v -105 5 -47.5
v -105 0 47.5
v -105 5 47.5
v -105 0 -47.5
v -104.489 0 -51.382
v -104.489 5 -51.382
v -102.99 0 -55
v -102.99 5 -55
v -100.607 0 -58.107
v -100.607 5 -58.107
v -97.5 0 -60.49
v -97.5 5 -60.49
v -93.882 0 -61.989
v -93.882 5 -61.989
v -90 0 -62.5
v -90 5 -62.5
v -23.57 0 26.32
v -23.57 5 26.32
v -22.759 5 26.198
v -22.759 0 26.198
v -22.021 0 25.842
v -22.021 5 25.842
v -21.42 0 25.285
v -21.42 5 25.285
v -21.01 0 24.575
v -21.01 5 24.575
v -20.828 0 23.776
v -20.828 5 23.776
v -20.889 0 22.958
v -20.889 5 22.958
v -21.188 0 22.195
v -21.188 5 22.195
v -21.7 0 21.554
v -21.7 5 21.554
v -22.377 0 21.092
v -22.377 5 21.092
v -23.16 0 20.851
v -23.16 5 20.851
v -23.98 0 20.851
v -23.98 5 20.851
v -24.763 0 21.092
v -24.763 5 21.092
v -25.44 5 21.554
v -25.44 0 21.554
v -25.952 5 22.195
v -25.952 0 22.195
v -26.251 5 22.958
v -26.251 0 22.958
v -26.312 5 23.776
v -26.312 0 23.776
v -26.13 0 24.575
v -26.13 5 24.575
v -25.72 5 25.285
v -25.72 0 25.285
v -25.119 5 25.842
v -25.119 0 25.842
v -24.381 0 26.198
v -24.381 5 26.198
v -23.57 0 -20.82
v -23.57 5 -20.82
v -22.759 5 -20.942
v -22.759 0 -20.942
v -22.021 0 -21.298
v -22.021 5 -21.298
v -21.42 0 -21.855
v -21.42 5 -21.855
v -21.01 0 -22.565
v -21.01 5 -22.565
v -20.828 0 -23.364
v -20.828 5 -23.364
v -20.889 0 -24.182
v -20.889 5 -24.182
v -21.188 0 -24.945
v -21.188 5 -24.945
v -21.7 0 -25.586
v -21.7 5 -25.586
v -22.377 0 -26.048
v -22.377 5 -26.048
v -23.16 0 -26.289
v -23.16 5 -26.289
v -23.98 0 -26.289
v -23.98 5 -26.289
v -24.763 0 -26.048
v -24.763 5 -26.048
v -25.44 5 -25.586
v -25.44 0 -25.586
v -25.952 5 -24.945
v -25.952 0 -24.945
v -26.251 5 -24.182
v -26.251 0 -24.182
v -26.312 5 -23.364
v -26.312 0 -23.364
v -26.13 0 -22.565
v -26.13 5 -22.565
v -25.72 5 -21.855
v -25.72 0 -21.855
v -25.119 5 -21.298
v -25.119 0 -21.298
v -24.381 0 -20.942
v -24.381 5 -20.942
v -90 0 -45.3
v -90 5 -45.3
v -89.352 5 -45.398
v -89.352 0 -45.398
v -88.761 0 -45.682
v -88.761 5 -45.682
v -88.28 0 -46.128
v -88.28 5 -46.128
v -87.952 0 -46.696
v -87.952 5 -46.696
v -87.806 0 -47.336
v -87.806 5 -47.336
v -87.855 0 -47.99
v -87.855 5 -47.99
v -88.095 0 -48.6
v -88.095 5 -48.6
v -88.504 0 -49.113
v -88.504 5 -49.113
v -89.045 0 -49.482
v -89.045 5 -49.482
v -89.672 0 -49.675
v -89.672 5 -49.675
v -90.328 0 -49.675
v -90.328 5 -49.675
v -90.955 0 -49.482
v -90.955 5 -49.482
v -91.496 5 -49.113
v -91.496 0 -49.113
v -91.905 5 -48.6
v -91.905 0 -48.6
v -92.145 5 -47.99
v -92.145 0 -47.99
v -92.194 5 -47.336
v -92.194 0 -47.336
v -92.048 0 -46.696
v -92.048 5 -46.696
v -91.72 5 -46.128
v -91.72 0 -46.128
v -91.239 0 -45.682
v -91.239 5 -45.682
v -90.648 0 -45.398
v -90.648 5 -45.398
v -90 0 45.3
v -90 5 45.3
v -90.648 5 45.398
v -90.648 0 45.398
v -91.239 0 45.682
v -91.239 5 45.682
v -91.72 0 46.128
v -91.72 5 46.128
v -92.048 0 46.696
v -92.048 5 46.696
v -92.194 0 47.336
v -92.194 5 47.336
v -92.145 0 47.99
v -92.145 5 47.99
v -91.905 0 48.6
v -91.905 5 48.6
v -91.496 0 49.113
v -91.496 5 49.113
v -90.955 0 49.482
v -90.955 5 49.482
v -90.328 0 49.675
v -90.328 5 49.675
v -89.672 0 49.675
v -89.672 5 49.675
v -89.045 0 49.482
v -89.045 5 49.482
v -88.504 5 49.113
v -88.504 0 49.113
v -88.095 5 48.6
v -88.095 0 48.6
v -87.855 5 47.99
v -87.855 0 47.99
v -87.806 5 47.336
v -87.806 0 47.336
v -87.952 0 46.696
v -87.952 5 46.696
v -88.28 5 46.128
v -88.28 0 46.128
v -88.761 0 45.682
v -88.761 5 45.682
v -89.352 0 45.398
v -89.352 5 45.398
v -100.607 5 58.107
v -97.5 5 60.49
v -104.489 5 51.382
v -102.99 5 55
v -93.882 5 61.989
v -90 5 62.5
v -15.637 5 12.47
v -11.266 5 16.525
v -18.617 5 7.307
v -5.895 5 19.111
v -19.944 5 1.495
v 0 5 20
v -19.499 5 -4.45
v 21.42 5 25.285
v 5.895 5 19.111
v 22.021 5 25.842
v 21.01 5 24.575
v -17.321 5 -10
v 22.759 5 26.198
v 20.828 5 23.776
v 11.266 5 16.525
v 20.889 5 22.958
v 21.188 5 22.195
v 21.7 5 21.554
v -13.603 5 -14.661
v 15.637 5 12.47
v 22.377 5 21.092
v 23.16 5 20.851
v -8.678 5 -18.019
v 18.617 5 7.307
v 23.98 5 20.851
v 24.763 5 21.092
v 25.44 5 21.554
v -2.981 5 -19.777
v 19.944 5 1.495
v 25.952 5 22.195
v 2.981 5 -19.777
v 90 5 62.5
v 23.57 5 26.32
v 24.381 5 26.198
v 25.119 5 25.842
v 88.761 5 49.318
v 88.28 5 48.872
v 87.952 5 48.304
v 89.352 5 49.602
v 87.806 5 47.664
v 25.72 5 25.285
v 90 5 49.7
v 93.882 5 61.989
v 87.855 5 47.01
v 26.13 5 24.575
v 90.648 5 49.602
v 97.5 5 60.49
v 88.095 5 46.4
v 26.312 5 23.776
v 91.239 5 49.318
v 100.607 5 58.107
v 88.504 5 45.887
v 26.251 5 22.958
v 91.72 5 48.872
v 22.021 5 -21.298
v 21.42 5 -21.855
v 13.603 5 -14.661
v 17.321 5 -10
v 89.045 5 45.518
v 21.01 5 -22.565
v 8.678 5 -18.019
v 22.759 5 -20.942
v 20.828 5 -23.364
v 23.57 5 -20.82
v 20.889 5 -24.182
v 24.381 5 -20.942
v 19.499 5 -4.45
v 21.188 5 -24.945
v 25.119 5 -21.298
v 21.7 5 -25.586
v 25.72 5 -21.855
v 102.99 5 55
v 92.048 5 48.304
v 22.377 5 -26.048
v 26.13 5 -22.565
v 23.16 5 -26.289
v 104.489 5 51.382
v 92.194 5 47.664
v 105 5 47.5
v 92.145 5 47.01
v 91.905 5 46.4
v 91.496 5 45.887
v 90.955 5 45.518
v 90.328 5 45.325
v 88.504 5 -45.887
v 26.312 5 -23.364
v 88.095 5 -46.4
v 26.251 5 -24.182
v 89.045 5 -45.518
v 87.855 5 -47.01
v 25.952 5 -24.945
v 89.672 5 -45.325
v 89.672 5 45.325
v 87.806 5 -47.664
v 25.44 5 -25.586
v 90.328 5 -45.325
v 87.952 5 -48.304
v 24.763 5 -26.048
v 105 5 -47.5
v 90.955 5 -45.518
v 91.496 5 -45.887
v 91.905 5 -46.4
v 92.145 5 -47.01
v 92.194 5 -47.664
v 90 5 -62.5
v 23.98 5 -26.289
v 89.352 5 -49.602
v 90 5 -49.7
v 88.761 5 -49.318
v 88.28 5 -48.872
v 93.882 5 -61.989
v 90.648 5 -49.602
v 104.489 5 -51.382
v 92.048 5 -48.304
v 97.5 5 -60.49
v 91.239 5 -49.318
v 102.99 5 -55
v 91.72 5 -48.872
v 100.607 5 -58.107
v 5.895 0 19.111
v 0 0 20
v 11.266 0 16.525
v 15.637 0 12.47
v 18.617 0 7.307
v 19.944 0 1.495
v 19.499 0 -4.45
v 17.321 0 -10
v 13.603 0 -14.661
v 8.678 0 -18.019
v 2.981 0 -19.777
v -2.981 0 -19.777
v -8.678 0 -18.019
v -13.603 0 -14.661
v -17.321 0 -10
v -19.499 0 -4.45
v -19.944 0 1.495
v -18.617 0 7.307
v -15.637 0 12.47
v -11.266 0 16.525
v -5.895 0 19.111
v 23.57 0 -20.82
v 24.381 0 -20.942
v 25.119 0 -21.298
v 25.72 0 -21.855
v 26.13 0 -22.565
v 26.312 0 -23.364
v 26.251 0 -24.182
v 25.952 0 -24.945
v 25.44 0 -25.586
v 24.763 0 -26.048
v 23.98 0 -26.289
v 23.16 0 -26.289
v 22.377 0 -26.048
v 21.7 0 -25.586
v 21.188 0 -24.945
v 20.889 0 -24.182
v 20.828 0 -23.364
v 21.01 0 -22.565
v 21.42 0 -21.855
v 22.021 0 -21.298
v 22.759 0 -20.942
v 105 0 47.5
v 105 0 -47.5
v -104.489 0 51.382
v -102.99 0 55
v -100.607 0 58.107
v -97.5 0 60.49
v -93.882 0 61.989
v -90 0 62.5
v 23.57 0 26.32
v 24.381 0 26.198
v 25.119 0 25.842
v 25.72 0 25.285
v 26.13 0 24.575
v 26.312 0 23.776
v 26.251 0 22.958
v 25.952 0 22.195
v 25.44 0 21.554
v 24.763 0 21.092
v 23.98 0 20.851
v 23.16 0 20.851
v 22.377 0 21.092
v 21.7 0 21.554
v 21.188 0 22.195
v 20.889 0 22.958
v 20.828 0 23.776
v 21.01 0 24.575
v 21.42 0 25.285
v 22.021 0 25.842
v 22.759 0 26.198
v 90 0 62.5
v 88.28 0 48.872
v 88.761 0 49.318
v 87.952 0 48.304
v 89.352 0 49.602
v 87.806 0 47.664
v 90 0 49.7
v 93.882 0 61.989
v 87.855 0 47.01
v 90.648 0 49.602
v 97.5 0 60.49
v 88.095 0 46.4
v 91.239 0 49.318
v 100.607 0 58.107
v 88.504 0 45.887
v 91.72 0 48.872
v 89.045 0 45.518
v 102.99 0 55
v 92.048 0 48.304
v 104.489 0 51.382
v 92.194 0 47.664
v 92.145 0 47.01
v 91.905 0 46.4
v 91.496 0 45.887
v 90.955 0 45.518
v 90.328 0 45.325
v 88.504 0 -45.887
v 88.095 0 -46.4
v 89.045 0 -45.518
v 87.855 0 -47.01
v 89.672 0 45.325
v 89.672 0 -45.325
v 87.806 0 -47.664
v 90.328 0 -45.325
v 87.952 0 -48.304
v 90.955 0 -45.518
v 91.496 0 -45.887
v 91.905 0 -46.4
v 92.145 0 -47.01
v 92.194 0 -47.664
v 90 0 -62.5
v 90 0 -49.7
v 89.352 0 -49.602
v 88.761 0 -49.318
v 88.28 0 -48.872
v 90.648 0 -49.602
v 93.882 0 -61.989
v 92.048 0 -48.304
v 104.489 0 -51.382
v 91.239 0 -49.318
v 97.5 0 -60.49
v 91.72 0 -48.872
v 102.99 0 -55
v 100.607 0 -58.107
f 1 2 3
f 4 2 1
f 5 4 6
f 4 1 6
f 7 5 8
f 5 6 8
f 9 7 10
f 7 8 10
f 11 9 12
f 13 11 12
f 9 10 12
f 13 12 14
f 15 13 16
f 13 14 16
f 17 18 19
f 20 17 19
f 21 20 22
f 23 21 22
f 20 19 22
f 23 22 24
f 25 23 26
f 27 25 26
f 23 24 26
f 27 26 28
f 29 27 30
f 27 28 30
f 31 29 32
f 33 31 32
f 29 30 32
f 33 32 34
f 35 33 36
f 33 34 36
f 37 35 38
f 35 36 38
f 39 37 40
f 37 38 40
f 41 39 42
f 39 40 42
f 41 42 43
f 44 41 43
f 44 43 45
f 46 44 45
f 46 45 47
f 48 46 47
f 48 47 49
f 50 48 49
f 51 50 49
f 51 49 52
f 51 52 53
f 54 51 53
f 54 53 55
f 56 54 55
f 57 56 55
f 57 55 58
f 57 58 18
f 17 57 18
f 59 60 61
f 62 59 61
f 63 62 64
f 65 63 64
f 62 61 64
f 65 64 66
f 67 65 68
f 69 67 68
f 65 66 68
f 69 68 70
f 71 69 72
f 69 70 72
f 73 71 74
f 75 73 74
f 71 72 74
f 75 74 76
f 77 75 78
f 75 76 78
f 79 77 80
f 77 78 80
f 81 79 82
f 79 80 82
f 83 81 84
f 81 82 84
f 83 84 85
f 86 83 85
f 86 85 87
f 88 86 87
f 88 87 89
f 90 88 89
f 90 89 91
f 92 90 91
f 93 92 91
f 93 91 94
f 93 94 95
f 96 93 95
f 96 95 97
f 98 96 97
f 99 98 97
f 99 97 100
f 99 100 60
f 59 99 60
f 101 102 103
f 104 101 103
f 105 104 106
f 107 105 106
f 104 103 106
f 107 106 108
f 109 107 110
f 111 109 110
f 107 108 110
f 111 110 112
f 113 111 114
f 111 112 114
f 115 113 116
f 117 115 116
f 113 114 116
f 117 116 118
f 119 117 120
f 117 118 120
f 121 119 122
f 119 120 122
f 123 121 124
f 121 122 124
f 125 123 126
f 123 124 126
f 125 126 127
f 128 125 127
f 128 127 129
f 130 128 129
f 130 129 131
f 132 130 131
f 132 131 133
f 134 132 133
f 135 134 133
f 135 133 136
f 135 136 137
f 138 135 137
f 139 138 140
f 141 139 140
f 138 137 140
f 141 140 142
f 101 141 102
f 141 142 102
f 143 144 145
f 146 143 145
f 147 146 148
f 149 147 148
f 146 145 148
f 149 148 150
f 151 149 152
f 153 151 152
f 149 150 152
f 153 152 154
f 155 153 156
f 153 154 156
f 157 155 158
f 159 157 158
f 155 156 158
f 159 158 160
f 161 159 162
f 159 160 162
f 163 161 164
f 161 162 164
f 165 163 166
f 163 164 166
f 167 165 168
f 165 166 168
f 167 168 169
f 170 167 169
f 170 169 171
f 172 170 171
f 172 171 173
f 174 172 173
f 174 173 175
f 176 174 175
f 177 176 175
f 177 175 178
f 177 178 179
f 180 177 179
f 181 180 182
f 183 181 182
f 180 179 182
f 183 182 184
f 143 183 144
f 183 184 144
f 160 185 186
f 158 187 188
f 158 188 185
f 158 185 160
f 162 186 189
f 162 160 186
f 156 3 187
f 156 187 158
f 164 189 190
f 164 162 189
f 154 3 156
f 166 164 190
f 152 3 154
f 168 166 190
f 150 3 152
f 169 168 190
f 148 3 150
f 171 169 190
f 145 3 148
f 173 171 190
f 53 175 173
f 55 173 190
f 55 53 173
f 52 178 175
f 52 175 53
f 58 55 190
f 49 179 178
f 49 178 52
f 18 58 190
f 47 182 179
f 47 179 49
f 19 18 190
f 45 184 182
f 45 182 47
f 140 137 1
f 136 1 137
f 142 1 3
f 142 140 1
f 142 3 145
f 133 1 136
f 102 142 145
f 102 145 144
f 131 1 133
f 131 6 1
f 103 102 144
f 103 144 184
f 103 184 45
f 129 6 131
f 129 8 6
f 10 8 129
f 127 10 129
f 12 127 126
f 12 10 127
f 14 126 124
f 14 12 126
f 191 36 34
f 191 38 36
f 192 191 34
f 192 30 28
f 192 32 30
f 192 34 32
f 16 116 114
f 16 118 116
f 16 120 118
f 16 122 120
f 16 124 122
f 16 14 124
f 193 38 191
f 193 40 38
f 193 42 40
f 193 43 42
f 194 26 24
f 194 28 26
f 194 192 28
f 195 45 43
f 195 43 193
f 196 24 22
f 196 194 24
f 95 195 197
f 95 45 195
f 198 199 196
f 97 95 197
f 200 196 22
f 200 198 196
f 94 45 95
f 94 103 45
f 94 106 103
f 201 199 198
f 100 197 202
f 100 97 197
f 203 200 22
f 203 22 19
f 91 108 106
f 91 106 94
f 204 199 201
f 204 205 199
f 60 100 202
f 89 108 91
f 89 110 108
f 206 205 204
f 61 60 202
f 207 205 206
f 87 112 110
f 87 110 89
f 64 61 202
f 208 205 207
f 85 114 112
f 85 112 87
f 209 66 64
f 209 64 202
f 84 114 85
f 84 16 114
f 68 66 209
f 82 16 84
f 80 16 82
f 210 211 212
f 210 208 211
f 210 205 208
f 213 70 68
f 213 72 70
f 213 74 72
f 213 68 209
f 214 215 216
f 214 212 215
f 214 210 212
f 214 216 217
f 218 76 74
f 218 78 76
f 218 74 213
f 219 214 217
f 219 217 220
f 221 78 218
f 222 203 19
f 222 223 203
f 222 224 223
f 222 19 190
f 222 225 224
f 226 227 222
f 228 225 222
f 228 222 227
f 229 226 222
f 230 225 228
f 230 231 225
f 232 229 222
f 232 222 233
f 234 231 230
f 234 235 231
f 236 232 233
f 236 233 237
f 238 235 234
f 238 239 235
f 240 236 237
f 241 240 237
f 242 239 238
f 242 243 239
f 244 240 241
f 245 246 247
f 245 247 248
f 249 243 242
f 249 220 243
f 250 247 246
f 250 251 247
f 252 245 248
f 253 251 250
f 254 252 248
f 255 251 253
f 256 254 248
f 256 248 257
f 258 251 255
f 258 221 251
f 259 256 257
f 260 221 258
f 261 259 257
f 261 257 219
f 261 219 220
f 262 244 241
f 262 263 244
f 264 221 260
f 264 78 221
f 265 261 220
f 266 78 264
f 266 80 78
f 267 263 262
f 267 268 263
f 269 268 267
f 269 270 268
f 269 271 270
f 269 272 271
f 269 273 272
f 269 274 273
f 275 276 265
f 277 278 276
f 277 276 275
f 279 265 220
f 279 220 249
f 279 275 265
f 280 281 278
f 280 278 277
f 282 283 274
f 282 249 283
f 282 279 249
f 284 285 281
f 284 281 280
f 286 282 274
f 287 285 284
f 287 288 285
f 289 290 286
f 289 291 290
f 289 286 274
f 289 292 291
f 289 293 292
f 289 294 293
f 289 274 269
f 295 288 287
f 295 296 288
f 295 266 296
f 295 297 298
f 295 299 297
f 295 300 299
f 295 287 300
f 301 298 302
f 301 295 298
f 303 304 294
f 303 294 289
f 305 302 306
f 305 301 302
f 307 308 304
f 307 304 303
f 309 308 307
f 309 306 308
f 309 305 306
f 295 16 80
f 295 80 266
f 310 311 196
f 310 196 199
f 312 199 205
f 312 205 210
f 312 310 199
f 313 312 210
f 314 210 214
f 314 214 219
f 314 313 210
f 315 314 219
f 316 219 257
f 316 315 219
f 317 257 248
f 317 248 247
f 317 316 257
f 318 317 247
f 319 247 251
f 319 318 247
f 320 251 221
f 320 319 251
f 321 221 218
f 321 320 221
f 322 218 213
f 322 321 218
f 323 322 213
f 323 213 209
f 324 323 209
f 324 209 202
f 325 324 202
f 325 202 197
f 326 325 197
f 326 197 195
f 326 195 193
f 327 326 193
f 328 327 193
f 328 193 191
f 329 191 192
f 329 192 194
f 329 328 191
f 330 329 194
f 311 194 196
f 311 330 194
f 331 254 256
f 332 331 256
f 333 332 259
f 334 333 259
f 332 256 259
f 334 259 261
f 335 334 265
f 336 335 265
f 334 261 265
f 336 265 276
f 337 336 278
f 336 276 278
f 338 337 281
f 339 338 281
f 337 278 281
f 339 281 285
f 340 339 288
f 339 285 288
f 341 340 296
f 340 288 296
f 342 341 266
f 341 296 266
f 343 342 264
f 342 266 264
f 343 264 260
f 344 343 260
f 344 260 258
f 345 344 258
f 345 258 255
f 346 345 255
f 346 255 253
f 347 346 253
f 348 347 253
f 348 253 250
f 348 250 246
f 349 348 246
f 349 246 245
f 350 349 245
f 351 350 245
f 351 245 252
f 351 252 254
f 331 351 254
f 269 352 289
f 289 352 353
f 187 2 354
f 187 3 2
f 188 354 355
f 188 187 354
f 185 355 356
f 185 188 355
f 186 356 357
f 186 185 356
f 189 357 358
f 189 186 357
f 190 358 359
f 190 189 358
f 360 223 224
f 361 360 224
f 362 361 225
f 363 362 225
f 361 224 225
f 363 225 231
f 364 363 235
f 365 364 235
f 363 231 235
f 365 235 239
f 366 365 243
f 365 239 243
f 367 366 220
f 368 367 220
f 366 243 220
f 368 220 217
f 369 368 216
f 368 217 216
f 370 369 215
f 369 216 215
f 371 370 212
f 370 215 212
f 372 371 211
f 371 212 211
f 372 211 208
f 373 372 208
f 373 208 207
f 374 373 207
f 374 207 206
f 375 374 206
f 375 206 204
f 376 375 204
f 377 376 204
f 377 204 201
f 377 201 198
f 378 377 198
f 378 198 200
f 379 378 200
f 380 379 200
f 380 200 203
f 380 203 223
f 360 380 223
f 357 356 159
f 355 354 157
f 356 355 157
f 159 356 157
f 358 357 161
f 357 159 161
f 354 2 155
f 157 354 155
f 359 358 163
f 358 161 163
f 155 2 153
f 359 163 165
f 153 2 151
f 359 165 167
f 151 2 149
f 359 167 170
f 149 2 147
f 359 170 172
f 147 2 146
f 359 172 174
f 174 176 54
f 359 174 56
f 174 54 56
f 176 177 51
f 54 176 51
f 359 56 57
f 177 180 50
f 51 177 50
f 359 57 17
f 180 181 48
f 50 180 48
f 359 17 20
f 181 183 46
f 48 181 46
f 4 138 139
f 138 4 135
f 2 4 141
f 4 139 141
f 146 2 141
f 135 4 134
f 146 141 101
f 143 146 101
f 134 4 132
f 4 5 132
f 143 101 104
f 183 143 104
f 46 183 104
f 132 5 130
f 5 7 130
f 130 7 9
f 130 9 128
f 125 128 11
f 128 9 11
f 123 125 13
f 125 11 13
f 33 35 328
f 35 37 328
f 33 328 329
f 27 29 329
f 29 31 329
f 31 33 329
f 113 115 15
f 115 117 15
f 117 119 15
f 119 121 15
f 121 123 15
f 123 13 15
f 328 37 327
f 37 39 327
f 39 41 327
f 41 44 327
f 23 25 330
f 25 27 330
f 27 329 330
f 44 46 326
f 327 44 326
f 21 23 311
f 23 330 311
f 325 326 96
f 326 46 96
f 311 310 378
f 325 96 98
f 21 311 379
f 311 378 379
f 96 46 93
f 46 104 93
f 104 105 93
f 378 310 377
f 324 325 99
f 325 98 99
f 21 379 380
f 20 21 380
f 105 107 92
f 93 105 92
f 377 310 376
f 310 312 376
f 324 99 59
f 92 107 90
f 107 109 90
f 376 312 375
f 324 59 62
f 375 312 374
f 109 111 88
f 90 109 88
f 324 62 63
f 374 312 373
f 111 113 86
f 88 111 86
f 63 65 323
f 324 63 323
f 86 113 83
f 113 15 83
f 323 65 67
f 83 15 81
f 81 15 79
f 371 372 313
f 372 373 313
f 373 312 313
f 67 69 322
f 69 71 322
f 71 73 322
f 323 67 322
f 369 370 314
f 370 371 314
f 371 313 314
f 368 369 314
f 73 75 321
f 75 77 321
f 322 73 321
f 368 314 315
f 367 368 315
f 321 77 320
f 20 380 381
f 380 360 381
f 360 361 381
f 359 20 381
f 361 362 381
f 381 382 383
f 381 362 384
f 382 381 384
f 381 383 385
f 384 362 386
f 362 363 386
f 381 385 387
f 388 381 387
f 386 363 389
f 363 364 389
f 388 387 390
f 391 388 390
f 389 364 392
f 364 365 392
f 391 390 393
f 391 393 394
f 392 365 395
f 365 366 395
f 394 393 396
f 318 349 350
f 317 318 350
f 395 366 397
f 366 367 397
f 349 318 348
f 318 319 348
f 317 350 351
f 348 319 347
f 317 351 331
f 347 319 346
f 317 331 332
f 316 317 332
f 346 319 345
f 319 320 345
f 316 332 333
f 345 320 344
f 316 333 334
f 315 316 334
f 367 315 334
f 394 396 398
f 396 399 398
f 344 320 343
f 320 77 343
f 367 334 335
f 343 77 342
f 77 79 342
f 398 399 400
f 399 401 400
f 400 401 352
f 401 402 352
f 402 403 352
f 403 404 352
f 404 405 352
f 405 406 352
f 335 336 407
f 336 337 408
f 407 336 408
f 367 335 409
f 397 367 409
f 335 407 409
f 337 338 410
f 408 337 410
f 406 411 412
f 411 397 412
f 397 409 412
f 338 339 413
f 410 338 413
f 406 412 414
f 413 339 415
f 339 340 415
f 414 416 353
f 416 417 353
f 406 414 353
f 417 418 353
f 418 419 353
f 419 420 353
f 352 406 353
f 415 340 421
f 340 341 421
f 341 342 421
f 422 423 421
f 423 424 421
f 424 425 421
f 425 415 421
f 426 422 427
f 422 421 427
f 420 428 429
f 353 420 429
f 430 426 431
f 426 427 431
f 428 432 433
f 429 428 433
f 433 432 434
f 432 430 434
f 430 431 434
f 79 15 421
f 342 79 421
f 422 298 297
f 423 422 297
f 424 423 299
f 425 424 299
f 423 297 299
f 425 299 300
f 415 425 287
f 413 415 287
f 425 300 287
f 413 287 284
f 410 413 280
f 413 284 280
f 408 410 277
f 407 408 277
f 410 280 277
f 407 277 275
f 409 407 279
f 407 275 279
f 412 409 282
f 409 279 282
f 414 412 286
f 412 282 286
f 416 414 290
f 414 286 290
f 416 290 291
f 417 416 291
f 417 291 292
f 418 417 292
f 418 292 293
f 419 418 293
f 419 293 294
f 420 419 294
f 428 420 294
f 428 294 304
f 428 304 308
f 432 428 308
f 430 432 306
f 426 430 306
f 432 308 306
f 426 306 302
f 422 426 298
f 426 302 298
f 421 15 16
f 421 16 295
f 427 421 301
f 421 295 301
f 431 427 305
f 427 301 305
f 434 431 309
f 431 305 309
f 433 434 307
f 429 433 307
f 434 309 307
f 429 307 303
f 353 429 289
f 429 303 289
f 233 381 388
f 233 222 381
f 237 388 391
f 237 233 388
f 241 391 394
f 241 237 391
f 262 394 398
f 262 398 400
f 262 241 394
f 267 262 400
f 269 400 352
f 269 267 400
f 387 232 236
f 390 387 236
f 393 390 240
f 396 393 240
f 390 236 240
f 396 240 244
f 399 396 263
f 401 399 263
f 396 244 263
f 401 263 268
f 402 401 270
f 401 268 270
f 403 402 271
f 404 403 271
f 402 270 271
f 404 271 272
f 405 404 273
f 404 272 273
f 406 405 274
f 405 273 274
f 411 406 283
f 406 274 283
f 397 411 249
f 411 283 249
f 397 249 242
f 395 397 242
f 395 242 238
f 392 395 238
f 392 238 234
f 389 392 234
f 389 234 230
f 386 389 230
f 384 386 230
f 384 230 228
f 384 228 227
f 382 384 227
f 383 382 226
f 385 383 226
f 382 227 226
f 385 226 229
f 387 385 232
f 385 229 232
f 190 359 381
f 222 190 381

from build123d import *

# Parameters (mm, degrees)
SKETCH_1_R          = 60
SKETCH_1_R_2        = 20
EXTRUDE_1_DEPTH     = 5
SKETCH_4_W          = 210
SKETCH_4_H          = 125
SKETCH_4_R          = 60
EXTRUDE_2_DEPTH     = 5
SKETCH_5_R          = 2.2
CUT_EXTRUDE_2_DEPTH = 5
FILLET_1_R          = 15
SKETCH_2_R          = 2.75
CUT_EXTRUDE_3_DEPTH = 10


with BuildPart() as part:
    # 草图1 → 凸台-拉伸1 (new body)
    with BuildSketch(Plane(origin=(0, 0, 0), x_dir=(1, 0, 0), z_dir=(0, 1, 0))):
        with Locations(Location((0, 0, 0), (0, 0, 270))):
            Circle(SKETCH_1_R)
        with Locations(Location((0, 0, 0), (0, 0, 270))):
            Circle(SKETCH_1_R_2, mode=Mode.SUBTRACT)
    extrude(amount=EXTRUDE_1_DEPTH)

    # 草图4 → 凸台-拉伸2 (add)
    with BuildSketch(Plane(origin=(0, 0, 0), x_dir=(1, 0, 0), z_dir=(0, 1, 0))):
        Rectangle(SKETCH_4_W, SKETCH_4_H)
        Circle(SKETCH_4_R, mode=Mode.SUBTRACT)
    extrude(amount=EXTRUDE_2_DEPTH)

    # 草图5 → 切除-拉伸2 (cut)
    with BuildSketch(Plane(origin=(0, 5, 0), x_dir=(1, 0, 0), z_dir=(0, 1, 0))):
        with Locations(Location((-90, 47.5, 0), (0, 0, 270))):
            Circle(SKETCH_5_R)
        with Locations(Location((90, 47.5, 0), (0, 0, 90))):
            Circle(SKETCH_5_R)
        with Locations(Location((90, -47.5, 0), (0, 0, 270))):
            Circle(SKETCH_5_R)
        with Locations(Location((-90, -47.5, 0), (0, 0, 90))):
            Circle(SKETCH_5_R)
    extrude(amount=-CUT_EXTRUDE_2_DEPTH, mode=Mode.SUBTRACT)

    # 圆角1
    fillet_1_edges = [part.edges().sort_by_distance(p)[0] for p in [
        (-105, 2.5, -62.5),
        (-105, 2.5, 62.5),
        (105, 2.5, 62.5),
        (105, 2.5, -62.5),
    ]]
    fillet(fillet_1_edges, radius=FILLET_1_R)

    # 草图2 → 切除-拉伸3 (cut)
    with BuildSketch(Plane(origin=(0, 5, 0), x_dir=(1, 0, 0), z_dir=(0, 1, 0))):
        with Locations(Location((-23.57, 23.57, 0), (0, 0, 270))):
            Circle(SKETCH_2_R)
        with Locations(Location((23.57, 23.57, 0), (0, 0, 270))):
            Circle(SKETCH_2_R)
        with Locations(Location((23.57, -23.57, 0), (0, 0, 270))):
            Circle(SKETCH_2_R)
        with Locations(Location((-23.57, -23.57, 0), (0, 0, 270))):
            Circle(SKETCH_2_R)
    extrude(amount=-CUT_EXTRUDE_3_DEPTH, mode=Mode.SUBTRACT)


solid = part.part
